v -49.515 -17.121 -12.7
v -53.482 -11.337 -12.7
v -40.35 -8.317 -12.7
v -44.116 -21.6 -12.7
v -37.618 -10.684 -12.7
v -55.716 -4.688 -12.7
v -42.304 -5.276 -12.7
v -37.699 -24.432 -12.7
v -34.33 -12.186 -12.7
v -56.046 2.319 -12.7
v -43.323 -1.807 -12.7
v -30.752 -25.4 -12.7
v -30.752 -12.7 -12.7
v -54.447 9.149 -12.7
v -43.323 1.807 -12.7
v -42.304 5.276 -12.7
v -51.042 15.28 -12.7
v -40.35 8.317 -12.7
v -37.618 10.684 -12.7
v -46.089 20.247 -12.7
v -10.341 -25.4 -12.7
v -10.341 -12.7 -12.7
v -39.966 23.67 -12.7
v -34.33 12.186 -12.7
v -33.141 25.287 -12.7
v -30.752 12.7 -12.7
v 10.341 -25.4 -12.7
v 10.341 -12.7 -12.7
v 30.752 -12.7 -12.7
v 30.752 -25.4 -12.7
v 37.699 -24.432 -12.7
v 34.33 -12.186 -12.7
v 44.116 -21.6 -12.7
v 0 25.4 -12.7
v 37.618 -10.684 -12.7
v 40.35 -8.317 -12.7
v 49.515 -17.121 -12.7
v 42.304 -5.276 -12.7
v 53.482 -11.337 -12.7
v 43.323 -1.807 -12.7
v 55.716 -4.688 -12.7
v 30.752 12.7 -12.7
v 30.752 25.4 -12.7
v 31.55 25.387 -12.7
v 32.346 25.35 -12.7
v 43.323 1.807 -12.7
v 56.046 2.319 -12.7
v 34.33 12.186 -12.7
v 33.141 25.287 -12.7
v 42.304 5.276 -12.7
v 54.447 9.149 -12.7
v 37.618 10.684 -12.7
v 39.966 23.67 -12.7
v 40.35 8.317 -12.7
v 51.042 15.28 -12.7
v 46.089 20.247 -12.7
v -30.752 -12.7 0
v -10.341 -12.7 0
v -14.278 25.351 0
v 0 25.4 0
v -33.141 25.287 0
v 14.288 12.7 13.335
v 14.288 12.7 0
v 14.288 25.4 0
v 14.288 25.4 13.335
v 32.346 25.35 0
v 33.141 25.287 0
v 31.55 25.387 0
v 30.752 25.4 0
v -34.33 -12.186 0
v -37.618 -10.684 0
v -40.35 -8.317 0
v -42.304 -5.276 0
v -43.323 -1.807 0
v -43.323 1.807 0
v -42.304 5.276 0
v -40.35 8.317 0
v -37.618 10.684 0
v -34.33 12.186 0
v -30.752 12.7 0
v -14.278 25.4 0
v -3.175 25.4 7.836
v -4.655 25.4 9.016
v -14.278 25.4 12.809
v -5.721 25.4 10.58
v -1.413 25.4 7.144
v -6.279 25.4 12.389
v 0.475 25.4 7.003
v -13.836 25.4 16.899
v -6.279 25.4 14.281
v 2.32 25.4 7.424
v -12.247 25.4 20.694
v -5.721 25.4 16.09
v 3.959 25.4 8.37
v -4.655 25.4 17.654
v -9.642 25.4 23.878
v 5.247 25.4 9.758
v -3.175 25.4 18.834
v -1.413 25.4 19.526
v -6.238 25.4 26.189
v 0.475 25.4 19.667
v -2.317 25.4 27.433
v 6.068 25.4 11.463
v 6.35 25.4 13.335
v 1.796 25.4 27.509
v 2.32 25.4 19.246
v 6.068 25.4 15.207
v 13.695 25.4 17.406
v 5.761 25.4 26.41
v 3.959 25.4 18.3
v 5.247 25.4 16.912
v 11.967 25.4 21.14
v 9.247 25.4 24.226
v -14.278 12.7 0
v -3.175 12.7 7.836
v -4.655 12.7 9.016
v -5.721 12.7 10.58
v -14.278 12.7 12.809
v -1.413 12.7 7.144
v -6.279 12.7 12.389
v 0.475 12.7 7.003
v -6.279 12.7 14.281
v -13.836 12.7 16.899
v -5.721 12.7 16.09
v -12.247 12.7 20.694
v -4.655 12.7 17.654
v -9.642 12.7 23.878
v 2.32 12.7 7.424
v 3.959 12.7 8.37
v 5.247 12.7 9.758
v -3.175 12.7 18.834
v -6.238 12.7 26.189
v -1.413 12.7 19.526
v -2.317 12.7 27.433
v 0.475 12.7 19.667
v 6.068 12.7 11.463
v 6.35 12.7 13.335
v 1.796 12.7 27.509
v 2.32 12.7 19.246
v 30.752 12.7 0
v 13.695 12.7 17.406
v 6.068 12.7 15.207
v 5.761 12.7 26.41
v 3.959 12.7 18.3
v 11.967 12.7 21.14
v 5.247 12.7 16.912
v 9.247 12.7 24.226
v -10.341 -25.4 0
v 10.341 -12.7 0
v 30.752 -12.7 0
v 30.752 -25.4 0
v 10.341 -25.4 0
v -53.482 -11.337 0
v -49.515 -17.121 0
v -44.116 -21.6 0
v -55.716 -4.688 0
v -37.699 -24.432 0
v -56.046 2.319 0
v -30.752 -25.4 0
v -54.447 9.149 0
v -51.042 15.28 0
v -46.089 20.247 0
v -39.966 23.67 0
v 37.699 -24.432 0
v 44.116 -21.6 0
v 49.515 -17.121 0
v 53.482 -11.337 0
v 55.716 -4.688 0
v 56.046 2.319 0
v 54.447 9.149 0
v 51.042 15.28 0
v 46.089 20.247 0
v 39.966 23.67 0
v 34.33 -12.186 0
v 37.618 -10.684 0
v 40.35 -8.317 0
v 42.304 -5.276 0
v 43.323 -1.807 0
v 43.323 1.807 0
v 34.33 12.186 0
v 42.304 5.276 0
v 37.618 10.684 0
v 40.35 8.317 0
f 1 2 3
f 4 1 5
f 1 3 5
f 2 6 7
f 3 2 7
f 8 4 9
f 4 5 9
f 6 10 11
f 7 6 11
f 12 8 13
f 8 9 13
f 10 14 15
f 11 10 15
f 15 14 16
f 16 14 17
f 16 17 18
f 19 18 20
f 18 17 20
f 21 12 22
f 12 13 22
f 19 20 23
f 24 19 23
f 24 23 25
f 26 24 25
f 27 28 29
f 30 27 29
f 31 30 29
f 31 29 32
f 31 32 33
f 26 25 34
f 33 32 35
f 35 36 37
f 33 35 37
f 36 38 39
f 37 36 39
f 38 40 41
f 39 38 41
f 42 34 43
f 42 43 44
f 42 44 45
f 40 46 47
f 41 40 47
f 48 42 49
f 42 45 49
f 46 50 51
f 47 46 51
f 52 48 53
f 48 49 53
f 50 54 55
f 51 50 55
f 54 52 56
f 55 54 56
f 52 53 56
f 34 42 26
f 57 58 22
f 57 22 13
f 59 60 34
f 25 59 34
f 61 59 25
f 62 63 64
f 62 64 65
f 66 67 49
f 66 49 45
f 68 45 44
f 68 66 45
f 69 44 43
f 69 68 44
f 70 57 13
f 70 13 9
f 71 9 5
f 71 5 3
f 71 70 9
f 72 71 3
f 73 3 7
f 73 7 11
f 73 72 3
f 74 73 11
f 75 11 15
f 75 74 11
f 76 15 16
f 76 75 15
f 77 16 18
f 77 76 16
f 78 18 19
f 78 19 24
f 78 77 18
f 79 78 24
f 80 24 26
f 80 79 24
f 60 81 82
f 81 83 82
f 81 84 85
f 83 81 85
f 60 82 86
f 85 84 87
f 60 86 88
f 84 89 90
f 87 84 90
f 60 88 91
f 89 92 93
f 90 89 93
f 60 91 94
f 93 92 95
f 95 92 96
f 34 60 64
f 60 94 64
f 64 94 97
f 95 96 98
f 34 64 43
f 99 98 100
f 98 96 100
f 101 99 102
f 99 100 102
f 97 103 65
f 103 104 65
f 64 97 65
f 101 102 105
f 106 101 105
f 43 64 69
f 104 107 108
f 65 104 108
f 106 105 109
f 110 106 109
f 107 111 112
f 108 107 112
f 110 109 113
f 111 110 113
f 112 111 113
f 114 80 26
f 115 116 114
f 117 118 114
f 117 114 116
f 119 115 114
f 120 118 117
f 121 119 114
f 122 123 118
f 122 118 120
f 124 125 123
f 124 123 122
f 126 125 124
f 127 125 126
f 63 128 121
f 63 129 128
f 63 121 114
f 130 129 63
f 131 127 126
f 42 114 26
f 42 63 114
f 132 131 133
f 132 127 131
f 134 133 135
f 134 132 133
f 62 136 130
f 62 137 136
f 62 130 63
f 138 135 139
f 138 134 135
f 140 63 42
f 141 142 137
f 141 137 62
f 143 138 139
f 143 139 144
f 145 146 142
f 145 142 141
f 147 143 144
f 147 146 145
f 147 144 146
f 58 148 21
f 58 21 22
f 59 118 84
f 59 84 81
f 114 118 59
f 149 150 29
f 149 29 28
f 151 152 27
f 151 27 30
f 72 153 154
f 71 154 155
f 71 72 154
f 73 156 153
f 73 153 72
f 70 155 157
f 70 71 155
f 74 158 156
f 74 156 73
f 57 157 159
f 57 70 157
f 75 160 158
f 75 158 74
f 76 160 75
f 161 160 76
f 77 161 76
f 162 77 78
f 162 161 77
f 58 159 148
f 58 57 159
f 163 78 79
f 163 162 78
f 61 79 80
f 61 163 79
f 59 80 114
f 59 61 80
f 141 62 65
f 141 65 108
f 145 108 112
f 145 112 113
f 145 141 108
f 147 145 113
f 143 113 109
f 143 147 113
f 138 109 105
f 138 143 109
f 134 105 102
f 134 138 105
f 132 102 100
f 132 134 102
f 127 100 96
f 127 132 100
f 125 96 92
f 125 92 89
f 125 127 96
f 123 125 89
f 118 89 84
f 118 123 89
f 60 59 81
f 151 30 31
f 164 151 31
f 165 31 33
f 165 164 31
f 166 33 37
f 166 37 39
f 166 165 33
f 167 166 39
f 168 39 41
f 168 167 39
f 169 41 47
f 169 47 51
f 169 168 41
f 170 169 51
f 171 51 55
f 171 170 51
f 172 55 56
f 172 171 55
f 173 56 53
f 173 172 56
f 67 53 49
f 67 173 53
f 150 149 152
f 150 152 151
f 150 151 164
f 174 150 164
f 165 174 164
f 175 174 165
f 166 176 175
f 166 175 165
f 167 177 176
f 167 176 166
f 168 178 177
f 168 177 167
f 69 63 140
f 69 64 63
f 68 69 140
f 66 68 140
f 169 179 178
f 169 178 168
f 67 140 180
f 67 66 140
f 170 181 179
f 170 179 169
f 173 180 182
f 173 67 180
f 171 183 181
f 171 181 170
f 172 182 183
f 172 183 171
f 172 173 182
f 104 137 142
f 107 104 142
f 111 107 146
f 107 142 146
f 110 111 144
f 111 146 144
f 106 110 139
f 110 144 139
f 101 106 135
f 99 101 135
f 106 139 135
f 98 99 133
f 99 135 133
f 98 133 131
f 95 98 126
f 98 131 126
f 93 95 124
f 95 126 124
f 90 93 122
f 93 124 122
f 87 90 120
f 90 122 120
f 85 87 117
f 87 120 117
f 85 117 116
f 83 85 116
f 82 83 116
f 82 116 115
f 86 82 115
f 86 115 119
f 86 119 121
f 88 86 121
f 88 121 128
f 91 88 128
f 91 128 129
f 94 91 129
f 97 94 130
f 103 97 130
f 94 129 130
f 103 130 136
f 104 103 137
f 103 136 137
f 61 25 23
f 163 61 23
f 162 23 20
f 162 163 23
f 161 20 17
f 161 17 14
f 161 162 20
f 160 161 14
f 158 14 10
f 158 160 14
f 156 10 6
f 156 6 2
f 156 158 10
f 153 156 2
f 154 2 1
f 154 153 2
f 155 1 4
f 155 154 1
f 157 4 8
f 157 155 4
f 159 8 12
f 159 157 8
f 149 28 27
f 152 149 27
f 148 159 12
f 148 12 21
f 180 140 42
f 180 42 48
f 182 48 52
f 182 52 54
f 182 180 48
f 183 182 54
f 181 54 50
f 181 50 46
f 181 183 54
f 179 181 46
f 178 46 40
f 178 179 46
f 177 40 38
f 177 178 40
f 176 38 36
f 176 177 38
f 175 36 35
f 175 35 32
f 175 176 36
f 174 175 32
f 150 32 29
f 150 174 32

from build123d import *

# Parameters (mm, degrees)
F1_DEPTH = 12.7
F2_R     = 6.35
F3_DEPTH = 12.7


with BuildPart() as f1:
    # F0 (on Top) → F1 (new body)
    with BuildSketch(Plane.XY):
        with BuildLine():
            ThreePointArc((30.752141, 12.7), (43.452141, 0), (30.752141, -12.7))
            Line((30.752141, -12.7), (10.341428, -12.7))
            Line((10.341428, -12.7), (10.341428, -25.4))
            Line((10.341428, -25.4), (30.752141, -25.4))
            ThreePointArc((30.752141, -25.4), (56.123977, -1.195799), (33.141087, 25.287407))
            Line((33.141087, 25.287407), (30.752141, 25.295523))
            Line((30.752141, 25.295523), (30.752141, 12.7))
        make_face()
        with BuildLine():
            Line((0, 12.7), (30.752141, 12.7))
            Line((30.752141, 12.7), (30.752141, 25.295523))
            Line((30.752141, 25.295523), (0, 25.4))
            Line((0, 25.4), (-33.141087, 25.287407))
            ThreePointArc((-33.141087, 25.287407), (-56.123977, -1.195799), (-30.752141, -25.4))
            Line((-30.752141, -25.4), (-10.341428, -25.4))
            Line((-10.341428, -25.4), (-10.341428, -12.7))
            Line((-10.341428, -12.7), (-30.752141, -12.7))
            ThreePointArc((-30.752141, -12.7), (-43.452141, 0), (-30.752141, 12.7))
            Line((-30.752141, 12.7), (0, 12.7))
        make_face()
        Polygon((0, 25.4), (30.752141, 25.295523), (30.752141, 25.4), align=None)
        with BuildLine():
            Line((30.752141, 25.4), (30.752141, 25.295523))
            Line((30.752141, 25.295523), (33.141087, 25.287407))
            ThreePointArc((33.141087, 25.287407), (31.94794, 25.371836), (30.752141, 25.4))
        make_face()
    extrude(amount=-F1_DEPTH)

    # F2 (on face) → F3 (join)
    with BuildSketch(Plane.XZ.offset(-12.7)):
        with BuildLine():
            Line((14.2875, 0), (14.2875, 13.335001))
            ThreePointArc((14.2875, 13.335001), (-0.263015, 27.62008), (-14.277816, 12.809059))
            Line((-14.277816, 12.809059), (-14.277816, 0))
            Line((-14.277816, 0), (14.2875, 0))
        make_face()
        with Locations((0, 13.335001)):
            Circle(F2_R, mode=Mode.SUBTRACT)
    extrude(amount=-F3_DEPTH)


solid = f1.part
